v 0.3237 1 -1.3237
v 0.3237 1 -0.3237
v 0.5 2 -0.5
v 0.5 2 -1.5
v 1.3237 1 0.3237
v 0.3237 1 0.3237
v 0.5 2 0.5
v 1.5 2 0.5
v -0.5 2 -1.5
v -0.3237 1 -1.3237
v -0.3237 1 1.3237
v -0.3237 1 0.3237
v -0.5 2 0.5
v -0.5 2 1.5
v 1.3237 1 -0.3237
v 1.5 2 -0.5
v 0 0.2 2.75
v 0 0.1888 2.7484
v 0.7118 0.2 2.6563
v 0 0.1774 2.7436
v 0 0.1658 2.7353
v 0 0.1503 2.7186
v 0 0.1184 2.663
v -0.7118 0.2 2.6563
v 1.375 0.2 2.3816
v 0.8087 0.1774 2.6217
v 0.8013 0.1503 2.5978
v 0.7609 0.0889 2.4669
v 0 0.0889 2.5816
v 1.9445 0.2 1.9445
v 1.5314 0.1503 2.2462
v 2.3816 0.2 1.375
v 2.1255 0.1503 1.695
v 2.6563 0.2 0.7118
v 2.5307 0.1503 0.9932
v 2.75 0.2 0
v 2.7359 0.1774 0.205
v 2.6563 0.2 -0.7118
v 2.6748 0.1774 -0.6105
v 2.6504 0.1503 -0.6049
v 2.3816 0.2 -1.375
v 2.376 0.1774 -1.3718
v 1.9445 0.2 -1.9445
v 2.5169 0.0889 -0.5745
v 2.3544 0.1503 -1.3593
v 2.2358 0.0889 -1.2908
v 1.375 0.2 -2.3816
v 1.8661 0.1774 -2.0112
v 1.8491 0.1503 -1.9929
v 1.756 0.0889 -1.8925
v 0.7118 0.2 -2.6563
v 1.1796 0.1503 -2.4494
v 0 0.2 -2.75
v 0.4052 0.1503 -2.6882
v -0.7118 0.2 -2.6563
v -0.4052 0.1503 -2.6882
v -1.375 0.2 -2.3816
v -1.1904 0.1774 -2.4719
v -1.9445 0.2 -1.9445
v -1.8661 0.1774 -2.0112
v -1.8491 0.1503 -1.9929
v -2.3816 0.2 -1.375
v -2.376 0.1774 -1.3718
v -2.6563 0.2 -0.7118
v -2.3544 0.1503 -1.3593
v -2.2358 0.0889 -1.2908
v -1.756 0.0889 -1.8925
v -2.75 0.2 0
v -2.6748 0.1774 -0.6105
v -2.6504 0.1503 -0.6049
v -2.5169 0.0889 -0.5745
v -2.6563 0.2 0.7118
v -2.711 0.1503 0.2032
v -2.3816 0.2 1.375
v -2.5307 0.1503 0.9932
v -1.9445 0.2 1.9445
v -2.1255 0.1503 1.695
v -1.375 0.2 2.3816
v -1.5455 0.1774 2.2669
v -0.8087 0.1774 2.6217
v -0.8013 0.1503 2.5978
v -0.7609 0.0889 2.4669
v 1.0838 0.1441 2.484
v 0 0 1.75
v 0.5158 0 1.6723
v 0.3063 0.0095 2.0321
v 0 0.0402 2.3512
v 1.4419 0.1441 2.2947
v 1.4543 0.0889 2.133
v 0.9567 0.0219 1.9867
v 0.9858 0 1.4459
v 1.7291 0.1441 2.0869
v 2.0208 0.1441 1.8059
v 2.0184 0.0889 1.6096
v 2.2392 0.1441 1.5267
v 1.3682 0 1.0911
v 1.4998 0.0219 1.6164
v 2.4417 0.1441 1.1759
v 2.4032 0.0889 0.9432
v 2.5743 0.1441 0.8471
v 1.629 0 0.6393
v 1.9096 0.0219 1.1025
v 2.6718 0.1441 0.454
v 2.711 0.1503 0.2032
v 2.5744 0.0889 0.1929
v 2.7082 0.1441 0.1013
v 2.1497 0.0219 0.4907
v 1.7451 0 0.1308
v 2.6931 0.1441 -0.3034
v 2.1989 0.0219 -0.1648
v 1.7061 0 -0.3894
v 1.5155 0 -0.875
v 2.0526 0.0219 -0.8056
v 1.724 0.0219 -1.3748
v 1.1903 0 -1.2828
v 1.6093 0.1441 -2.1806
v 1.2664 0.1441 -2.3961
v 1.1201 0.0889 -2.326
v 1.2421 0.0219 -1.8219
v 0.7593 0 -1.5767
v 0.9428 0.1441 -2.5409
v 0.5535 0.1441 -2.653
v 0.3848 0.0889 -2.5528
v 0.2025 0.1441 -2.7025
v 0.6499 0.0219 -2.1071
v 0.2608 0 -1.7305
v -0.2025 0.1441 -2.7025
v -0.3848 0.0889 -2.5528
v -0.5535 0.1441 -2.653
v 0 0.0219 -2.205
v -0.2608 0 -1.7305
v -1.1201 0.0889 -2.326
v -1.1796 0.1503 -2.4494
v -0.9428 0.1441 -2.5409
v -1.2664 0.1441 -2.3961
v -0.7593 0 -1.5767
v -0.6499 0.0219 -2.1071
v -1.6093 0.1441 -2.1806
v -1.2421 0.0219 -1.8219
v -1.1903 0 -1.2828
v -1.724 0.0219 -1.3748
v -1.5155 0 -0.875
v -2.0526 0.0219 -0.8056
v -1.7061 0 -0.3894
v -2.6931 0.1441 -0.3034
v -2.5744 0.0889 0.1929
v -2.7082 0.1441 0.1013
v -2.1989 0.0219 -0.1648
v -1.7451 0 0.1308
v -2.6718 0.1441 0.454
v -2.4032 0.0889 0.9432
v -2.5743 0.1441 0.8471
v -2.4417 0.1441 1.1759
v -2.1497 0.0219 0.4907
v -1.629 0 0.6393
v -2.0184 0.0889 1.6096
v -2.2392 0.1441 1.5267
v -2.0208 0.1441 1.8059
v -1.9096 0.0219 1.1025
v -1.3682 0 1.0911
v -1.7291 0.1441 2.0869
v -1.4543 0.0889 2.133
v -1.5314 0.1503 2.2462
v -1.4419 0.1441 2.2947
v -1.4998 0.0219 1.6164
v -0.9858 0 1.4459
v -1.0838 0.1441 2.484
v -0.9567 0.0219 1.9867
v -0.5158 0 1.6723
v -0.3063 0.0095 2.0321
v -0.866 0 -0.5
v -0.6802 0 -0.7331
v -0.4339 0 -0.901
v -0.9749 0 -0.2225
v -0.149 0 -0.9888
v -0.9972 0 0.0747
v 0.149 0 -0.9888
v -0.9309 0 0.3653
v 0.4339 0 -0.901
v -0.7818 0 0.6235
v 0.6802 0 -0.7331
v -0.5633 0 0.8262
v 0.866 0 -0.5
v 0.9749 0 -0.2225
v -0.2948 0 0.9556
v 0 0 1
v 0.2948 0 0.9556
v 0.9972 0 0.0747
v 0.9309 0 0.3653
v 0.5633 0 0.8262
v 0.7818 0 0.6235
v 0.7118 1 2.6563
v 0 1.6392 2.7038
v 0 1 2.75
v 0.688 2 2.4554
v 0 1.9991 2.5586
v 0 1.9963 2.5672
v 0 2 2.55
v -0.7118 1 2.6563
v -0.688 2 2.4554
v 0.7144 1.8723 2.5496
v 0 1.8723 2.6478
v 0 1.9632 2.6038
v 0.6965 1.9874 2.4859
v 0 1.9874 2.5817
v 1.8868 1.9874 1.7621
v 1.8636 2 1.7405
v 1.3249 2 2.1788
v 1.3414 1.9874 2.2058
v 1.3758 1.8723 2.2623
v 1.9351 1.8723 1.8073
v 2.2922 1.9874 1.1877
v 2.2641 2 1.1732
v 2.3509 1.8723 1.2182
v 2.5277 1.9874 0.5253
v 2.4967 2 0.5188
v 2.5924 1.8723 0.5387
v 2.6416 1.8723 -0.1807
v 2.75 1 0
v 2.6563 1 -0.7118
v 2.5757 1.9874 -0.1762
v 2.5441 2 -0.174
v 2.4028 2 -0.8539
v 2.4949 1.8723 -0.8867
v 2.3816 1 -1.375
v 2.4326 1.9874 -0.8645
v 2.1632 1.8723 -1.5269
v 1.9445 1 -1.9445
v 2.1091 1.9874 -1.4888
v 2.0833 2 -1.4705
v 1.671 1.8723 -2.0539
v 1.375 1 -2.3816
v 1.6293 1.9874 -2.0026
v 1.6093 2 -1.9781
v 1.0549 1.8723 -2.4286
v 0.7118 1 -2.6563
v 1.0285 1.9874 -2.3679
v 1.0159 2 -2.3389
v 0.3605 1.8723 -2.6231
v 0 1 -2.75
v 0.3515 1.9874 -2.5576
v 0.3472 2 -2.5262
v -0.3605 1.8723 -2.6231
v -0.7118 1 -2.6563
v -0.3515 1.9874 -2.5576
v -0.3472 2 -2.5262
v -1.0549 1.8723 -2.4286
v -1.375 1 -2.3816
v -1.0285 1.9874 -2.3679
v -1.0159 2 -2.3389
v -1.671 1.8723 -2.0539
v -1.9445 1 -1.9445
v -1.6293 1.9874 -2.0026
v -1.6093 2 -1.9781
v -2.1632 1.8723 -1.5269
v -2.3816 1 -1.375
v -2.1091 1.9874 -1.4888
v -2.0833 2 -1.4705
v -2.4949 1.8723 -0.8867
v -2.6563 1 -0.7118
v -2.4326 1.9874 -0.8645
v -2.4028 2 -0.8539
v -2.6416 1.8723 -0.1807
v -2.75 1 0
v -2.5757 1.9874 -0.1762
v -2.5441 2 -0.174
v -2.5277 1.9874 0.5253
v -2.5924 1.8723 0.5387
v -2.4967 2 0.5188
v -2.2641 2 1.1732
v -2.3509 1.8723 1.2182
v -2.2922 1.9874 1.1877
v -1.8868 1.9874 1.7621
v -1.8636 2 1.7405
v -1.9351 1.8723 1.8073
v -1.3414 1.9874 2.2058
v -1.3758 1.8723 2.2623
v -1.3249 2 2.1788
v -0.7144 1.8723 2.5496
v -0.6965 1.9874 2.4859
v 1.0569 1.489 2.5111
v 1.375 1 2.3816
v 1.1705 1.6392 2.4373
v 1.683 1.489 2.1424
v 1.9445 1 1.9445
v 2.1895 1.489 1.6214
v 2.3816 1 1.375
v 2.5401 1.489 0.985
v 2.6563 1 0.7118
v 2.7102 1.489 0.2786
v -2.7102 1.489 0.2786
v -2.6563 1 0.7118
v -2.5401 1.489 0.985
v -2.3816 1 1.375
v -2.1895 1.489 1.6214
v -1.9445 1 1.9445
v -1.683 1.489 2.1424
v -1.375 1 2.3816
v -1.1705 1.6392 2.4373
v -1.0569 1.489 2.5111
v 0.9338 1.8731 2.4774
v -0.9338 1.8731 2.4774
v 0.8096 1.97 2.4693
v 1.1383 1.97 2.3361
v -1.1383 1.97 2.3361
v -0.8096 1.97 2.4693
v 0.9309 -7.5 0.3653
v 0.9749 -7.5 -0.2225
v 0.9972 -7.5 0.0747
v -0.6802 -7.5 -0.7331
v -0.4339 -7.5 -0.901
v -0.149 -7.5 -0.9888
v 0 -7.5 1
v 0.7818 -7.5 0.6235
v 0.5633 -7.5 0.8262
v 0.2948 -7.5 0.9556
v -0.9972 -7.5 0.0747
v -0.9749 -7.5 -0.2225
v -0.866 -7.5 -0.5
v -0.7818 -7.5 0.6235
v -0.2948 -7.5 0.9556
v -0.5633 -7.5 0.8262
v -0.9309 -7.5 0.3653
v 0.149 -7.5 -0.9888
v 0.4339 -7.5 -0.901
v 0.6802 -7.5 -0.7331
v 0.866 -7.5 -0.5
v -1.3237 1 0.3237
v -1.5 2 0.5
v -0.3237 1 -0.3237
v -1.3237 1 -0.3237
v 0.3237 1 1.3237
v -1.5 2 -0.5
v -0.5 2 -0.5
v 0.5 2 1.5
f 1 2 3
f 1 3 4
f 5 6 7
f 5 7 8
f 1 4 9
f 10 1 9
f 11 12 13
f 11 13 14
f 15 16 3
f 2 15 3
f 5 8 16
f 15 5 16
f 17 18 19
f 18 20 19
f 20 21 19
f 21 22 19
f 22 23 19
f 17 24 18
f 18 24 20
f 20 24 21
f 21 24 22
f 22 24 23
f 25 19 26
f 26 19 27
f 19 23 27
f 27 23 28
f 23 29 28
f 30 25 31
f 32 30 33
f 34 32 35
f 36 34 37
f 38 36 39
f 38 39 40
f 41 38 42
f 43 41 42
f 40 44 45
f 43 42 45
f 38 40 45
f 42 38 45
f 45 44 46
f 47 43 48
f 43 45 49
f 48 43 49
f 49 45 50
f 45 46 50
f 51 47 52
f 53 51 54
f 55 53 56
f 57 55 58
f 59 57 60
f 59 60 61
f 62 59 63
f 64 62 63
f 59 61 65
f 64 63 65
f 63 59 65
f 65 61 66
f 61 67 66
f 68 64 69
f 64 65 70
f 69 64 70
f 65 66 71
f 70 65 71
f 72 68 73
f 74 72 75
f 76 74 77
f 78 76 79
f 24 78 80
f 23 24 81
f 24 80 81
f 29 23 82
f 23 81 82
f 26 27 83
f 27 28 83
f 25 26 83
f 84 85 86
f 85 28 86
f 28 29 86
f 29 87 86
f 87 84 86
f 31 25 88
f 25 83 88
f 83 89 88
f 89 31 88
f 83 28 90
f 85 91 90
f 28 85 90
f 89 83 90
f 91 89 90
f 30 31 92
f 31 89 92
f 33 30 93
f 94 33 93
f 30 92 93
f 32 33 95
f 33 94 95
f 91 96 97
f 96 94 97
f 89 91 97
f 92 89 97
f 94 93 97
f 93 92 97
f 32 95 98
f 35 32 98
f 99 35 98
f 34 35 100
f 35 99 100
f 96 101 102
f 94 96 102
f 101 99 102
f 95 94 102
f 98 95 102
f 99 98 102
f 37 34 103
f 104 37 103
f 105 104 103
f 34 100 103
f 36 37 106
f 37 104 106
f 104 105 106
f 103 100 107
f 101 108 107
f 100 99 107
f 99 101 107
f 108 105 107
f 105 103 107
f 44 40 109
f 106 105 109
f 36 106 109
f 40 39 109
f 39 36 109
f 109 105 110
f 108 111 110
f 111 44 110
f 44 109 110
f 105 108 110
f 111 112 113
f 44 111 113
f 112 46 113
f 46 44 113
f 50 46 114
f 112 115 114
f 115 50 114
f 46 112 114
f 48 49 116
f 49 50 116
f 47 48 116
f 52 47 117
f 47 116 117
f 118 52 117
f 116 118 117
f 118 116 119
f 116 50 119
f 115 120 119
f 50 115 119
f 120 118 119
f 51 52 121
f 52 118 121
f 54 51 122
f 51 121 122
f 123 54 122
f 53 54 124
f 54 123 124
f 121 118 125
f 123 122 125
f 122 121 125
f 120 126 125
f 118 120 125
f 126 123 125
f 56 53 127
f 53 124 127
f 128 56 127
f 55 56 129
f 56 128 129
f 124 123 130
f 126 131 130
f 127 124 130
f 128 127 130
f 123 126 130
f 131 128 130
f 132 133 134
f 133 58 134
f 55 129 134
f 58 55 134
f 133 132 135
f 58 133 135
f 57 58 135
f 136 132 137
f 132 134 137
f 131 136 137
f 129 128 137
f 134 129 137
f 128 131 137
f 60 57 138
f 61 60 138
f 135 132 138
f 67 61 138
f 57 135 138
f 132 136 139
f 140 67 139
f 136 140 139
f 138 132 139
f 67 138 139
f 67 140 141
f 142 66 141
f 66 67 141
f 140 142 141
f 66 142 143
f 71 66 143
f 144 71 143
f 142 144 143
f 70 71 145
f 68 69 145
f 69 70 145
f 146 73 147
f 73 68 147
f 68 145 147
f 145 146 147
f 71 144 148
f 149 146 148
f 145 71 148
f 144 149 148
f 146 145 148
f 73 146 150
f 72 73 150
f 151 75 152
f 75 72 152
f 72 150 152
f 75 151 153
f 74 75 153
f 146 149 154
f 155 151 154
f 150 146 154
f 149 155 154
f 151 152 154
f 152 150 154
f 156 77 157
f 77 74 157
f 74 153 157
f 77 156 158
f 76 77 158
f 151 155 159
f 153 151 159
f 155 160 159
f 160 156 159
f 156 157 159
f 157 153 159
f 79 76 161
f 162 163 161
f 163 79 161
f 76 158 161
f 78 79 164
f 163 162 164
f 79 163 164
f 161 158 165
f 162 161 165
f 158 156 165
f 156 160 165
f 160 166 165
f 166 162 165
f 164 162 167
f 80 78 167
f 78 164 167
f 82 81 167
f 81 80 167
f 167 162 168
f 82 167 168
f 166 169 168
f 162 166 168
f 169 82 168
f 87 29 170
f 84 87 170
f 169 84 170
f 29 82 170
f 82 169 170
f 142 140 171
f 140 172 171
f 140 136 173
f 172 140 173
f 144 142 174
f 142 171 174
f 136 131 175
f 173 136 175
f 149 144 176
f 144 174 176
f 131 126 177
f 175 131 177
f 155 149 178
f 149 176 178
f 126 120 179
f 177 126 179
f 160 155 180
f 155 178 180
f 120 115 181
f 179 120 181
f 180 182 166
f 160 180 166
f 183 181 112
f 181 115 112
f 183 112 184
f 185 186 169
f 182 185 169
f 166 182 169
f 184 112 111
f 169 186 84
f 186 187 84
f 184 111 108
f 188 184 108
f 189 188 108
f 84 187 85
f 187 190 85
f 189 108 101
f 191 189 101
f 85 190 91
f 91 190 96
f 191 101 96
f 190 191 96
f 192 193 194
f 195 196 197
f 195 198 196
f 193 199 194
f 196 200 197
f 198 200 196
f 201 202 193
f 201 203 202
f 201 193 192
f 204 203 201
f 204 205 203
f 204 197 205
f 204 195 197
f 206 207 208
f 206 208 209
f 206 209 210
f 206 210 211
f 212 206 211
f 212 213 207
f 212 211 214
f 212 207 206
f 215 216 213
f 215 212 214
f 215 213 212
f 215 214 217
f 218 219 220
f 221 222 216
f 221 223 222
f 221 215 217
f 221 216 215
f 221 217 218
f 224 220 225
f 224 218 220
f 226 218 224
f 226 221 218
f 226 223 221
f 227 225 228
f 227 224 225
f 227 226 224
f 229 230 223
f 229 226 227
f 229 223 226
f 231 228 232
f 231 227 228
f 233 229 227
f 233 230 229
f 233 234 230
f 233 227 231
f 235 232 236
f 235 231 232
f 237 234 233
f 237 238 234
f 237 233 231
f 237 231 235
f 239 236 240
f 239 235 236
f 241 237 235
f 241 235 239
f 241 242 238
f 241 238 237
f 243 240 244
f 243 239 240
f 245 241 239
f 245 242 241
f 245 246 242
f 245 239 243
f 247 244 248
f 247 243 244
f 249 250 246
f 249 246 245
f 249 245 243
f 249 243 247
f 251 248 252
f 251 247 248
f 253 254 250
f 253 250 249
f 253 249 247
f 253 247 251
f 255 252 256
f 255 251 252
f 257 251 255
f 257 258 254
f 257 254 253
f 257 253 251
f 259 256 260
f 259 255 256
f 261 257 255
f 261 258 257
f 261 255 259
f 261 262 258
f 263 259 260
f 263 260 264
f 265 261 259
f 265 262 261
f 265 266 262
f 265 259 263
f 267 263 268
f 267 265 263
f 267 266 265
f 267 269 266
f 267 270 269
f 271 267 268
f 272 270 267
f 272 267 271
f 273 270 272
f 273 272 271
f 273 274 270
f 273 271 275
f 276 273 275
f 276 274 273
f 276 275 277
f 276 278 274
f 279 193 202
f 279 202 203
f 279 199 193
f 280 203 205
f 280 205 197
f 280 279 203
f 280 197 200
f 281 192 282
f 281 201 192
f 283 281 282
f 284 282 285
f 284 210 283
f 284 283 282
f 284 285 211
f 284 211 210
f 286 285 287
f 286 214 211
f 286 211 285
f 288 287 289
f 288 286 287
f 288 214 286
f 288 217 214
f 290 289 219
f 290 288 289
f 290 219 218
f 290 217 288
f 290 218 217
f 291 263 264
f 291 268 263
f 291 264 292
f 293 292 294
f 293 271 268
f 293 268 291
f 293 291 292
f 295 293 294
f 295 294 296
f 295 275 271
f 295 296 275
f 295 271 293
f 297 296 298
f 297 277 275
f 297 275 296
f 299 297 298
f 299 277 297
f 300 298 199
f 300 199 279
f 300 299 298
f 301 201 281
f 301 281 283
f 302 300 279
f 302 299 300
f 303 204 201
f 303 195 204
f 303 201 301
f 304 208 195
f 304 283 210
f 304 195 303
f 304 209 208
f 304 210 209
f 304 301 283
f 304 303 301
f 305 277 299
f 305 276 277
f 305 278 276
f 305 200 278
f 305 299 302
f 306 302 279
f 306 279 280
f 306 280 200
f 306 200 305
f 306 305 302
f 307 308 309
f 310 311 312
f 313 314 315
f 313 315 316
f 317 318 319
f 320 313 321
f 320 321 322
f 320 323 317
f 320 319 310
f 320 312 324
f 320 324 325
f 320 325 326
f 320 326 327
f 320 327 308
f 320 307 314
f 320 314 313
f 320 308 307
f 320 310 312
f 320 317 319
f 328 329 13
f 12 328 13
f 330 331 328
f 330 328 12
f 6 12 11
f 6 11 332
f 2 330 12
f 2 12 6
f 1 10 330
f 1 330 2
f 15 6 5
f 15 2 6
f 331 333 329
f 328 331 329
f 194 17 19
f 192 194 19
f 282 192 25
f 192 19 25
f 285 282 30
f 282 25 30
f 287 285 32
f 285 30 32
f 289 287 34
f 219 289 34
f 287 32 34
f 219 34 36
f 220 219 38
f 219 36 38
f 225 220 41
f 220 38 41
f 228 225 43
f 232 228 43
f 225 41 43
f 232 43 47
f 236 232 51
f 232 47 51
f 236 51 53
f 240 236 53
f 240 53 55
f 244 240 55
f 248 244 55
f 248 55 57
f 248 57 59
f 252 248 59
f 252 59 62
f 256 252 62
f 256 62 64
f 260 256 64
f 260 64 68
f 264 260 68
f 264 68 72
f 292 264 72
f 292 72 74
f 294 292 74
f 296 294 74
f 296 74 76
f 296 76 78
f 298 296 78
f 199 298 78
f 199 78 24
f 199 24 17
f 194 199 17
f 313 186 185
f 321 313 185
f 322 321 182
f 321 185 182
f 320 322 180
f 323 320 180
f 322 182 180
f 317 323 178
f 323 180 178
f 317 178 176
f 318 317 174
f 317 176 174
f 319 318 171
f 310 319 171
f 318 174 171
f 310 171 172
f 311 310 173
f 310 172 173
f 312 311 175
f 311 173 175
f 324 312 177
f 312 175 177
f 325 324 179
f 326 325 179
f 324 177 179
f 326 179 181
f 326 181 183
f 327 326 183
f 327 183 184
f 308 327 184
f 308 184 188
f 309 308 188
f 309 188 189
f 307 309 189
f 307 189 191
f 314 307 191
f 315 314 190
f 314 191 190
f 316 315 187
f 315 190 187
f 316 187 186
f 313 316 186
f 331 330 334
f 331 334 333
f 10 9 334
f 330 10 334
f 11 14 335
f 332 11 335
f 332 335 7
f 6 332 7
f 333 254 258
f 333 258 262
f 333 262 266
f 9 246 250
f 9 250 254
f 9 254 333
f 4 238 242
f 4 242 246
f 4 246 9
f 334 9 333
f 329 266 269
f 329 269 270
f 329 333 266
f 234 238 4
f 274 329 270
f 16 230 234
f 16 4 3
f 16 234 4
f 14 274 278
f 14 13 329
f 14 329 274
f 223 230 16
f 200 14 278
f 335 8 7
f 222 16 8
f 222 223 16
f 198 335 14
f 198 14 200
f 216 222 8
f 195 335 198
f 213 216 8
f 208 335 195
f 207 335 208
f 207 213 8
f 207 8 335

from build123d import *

# Parameters (mm, degrees)
SKETCH1_R           = 2.75
BOSS_EXTRUDE1_DEPTH = 2
FILLET1_SIZE        = 0.2
FILLET1_SIZE_2      = 1
SKETCH2_R           = 1
BOSS_EXTRUDE2_DEPTH = 7.5
CUT_EXTRUDE1_DEPTH  = 1
CUT_EXTRUDE1_DRAFT  = -10


with BuildPart() as part:
    # Sketch1 → Boss-Extrude1 (new body)
    with BuildSketch(Plane(origin=(0, 0, 0), x_dir=(1, 0, 0), z_dir=(0, 1, 0))):
        with Locations(Location((0, 0, 0), (0, 0, 270))):
            Circle(SKETCH1_R)
    extrude(amount=BOSS_EXTRUDE1_DEPTH)

    # Fillet1
    # an asymmetric fillet: 1, 0.2 mm, written as the material it takes off along each edge
    with BuildSketch(Plane(origin=(0, 0, 0), x_dir=(0, 0, 1), z_dir=(-1, 0, 0))) as fillet1_piece_1:
        with BuildLine():
            Bezier((2.75, FILLET1_SIZE), (2.75, 0), (2.75 - FILLET1_SIZE_2, 0), weights=[1, 0.707106781, 1])
            Line((2.75 - FILLET1_SIZE_2, 0), (2.75, 0))
            Line((2.75, 0), (2.75, FILLET1_SIZE))
        make_face()
    revolve(axis=Axis((0, 0, 0), (0, 1, 0)), mode=Mode.SUBTRACT)
    with BuildSketch(Plane(origin=(0, 2, 0), x_dir=(0, 0, 1), z_dir=(-1, 0, 0))) as fillet1_piece_2:
        with BuildLine():
            Bezier((2.75, -FILLET1_SIZE_2), (2.75, 0), (2.75 - FILLET1_SIZE, 0), weights=[1, 0.707106781, 1])
            Line((2.75 - FILLET1_SIZE, 0), (2.75, 0))
            Line((2.75, 0), (2.75, -FILLET1_SIZE_2))
        make_face()
    revolve(axis=Axis((0, 2, 0), (0, 1, 0)), mode=Mode.SUBTRACT)

    # Sketch2 → Boss-Extrude2 (add)
    with BuildSketch(Plane.XZ):
        with Locations(Location((0, 0, 0), (0, 0, 90))):
            Circle(SKETCH2_R)
    extrude(amount=BOSS_EXTRUDE2_DEPTH)


with BuildPart() as cut_extrude1_tool:
    # Sketch5 → Cut-Extrude1 (with draft: the straight prism first)
    with BuildSketch(Plane(origin=(0, 2, 0), x_dir=(1, 0, 0), z_dir=(0, 1, 0))):
        Polygon((0.5, 0.5), (0.5, 1.5), (-0.5, 1.5), (-0.5, 0.5), (-1.5, 0.5), (-1.5, -0.5), (-0.5, -0.5), (-0.5, -1.5), (0.5, -1.5), (0.5, -0.5), (1.5, -0.5), (1.5, 0.5), align=None)
    extrude(amount=-CUT_EXTRUDE1_DEPTH)
    # Cut-Extrude1: the draft: its side faces are tilted about the plane it starts from
    cut_extrude1_sides = [cut_extrude1_tool.faces().sort_by_distance(p)[0] for p in [
        (0.5, 1.5, -1),
        (0, 1.5, -1.5),
        (-0.5, 1.5, -1),
        (-1, 1.5, -0.5),
        (-1.5, 1.5, 0),
        (-1, 1.5, 0.5),
        (-0.5, 1.5, 1),
        (0, 1.5, 1.5),
        (0.5, 1.5, 1),
        (1, 1.5, 0.5),
        (1.5, 1.5, 0),
        (1, 1.5, -0.5),
    ]]
    draft(cut_extrude1_sides, Plane(origin=(0, 2, 0), x_dir=(1, 0, 0), z_dir=(0, 1, 0)), CUT_EXTRUDE1_DRAFT)


with BuildPart() as part_1:
    add(part.part)

    # Cut-Extrude1: cut by cut_extrude1_tool
    add(cut_extrude1_tool.part, mode=Mode.SUBTRACT)


solid = part_1.part
